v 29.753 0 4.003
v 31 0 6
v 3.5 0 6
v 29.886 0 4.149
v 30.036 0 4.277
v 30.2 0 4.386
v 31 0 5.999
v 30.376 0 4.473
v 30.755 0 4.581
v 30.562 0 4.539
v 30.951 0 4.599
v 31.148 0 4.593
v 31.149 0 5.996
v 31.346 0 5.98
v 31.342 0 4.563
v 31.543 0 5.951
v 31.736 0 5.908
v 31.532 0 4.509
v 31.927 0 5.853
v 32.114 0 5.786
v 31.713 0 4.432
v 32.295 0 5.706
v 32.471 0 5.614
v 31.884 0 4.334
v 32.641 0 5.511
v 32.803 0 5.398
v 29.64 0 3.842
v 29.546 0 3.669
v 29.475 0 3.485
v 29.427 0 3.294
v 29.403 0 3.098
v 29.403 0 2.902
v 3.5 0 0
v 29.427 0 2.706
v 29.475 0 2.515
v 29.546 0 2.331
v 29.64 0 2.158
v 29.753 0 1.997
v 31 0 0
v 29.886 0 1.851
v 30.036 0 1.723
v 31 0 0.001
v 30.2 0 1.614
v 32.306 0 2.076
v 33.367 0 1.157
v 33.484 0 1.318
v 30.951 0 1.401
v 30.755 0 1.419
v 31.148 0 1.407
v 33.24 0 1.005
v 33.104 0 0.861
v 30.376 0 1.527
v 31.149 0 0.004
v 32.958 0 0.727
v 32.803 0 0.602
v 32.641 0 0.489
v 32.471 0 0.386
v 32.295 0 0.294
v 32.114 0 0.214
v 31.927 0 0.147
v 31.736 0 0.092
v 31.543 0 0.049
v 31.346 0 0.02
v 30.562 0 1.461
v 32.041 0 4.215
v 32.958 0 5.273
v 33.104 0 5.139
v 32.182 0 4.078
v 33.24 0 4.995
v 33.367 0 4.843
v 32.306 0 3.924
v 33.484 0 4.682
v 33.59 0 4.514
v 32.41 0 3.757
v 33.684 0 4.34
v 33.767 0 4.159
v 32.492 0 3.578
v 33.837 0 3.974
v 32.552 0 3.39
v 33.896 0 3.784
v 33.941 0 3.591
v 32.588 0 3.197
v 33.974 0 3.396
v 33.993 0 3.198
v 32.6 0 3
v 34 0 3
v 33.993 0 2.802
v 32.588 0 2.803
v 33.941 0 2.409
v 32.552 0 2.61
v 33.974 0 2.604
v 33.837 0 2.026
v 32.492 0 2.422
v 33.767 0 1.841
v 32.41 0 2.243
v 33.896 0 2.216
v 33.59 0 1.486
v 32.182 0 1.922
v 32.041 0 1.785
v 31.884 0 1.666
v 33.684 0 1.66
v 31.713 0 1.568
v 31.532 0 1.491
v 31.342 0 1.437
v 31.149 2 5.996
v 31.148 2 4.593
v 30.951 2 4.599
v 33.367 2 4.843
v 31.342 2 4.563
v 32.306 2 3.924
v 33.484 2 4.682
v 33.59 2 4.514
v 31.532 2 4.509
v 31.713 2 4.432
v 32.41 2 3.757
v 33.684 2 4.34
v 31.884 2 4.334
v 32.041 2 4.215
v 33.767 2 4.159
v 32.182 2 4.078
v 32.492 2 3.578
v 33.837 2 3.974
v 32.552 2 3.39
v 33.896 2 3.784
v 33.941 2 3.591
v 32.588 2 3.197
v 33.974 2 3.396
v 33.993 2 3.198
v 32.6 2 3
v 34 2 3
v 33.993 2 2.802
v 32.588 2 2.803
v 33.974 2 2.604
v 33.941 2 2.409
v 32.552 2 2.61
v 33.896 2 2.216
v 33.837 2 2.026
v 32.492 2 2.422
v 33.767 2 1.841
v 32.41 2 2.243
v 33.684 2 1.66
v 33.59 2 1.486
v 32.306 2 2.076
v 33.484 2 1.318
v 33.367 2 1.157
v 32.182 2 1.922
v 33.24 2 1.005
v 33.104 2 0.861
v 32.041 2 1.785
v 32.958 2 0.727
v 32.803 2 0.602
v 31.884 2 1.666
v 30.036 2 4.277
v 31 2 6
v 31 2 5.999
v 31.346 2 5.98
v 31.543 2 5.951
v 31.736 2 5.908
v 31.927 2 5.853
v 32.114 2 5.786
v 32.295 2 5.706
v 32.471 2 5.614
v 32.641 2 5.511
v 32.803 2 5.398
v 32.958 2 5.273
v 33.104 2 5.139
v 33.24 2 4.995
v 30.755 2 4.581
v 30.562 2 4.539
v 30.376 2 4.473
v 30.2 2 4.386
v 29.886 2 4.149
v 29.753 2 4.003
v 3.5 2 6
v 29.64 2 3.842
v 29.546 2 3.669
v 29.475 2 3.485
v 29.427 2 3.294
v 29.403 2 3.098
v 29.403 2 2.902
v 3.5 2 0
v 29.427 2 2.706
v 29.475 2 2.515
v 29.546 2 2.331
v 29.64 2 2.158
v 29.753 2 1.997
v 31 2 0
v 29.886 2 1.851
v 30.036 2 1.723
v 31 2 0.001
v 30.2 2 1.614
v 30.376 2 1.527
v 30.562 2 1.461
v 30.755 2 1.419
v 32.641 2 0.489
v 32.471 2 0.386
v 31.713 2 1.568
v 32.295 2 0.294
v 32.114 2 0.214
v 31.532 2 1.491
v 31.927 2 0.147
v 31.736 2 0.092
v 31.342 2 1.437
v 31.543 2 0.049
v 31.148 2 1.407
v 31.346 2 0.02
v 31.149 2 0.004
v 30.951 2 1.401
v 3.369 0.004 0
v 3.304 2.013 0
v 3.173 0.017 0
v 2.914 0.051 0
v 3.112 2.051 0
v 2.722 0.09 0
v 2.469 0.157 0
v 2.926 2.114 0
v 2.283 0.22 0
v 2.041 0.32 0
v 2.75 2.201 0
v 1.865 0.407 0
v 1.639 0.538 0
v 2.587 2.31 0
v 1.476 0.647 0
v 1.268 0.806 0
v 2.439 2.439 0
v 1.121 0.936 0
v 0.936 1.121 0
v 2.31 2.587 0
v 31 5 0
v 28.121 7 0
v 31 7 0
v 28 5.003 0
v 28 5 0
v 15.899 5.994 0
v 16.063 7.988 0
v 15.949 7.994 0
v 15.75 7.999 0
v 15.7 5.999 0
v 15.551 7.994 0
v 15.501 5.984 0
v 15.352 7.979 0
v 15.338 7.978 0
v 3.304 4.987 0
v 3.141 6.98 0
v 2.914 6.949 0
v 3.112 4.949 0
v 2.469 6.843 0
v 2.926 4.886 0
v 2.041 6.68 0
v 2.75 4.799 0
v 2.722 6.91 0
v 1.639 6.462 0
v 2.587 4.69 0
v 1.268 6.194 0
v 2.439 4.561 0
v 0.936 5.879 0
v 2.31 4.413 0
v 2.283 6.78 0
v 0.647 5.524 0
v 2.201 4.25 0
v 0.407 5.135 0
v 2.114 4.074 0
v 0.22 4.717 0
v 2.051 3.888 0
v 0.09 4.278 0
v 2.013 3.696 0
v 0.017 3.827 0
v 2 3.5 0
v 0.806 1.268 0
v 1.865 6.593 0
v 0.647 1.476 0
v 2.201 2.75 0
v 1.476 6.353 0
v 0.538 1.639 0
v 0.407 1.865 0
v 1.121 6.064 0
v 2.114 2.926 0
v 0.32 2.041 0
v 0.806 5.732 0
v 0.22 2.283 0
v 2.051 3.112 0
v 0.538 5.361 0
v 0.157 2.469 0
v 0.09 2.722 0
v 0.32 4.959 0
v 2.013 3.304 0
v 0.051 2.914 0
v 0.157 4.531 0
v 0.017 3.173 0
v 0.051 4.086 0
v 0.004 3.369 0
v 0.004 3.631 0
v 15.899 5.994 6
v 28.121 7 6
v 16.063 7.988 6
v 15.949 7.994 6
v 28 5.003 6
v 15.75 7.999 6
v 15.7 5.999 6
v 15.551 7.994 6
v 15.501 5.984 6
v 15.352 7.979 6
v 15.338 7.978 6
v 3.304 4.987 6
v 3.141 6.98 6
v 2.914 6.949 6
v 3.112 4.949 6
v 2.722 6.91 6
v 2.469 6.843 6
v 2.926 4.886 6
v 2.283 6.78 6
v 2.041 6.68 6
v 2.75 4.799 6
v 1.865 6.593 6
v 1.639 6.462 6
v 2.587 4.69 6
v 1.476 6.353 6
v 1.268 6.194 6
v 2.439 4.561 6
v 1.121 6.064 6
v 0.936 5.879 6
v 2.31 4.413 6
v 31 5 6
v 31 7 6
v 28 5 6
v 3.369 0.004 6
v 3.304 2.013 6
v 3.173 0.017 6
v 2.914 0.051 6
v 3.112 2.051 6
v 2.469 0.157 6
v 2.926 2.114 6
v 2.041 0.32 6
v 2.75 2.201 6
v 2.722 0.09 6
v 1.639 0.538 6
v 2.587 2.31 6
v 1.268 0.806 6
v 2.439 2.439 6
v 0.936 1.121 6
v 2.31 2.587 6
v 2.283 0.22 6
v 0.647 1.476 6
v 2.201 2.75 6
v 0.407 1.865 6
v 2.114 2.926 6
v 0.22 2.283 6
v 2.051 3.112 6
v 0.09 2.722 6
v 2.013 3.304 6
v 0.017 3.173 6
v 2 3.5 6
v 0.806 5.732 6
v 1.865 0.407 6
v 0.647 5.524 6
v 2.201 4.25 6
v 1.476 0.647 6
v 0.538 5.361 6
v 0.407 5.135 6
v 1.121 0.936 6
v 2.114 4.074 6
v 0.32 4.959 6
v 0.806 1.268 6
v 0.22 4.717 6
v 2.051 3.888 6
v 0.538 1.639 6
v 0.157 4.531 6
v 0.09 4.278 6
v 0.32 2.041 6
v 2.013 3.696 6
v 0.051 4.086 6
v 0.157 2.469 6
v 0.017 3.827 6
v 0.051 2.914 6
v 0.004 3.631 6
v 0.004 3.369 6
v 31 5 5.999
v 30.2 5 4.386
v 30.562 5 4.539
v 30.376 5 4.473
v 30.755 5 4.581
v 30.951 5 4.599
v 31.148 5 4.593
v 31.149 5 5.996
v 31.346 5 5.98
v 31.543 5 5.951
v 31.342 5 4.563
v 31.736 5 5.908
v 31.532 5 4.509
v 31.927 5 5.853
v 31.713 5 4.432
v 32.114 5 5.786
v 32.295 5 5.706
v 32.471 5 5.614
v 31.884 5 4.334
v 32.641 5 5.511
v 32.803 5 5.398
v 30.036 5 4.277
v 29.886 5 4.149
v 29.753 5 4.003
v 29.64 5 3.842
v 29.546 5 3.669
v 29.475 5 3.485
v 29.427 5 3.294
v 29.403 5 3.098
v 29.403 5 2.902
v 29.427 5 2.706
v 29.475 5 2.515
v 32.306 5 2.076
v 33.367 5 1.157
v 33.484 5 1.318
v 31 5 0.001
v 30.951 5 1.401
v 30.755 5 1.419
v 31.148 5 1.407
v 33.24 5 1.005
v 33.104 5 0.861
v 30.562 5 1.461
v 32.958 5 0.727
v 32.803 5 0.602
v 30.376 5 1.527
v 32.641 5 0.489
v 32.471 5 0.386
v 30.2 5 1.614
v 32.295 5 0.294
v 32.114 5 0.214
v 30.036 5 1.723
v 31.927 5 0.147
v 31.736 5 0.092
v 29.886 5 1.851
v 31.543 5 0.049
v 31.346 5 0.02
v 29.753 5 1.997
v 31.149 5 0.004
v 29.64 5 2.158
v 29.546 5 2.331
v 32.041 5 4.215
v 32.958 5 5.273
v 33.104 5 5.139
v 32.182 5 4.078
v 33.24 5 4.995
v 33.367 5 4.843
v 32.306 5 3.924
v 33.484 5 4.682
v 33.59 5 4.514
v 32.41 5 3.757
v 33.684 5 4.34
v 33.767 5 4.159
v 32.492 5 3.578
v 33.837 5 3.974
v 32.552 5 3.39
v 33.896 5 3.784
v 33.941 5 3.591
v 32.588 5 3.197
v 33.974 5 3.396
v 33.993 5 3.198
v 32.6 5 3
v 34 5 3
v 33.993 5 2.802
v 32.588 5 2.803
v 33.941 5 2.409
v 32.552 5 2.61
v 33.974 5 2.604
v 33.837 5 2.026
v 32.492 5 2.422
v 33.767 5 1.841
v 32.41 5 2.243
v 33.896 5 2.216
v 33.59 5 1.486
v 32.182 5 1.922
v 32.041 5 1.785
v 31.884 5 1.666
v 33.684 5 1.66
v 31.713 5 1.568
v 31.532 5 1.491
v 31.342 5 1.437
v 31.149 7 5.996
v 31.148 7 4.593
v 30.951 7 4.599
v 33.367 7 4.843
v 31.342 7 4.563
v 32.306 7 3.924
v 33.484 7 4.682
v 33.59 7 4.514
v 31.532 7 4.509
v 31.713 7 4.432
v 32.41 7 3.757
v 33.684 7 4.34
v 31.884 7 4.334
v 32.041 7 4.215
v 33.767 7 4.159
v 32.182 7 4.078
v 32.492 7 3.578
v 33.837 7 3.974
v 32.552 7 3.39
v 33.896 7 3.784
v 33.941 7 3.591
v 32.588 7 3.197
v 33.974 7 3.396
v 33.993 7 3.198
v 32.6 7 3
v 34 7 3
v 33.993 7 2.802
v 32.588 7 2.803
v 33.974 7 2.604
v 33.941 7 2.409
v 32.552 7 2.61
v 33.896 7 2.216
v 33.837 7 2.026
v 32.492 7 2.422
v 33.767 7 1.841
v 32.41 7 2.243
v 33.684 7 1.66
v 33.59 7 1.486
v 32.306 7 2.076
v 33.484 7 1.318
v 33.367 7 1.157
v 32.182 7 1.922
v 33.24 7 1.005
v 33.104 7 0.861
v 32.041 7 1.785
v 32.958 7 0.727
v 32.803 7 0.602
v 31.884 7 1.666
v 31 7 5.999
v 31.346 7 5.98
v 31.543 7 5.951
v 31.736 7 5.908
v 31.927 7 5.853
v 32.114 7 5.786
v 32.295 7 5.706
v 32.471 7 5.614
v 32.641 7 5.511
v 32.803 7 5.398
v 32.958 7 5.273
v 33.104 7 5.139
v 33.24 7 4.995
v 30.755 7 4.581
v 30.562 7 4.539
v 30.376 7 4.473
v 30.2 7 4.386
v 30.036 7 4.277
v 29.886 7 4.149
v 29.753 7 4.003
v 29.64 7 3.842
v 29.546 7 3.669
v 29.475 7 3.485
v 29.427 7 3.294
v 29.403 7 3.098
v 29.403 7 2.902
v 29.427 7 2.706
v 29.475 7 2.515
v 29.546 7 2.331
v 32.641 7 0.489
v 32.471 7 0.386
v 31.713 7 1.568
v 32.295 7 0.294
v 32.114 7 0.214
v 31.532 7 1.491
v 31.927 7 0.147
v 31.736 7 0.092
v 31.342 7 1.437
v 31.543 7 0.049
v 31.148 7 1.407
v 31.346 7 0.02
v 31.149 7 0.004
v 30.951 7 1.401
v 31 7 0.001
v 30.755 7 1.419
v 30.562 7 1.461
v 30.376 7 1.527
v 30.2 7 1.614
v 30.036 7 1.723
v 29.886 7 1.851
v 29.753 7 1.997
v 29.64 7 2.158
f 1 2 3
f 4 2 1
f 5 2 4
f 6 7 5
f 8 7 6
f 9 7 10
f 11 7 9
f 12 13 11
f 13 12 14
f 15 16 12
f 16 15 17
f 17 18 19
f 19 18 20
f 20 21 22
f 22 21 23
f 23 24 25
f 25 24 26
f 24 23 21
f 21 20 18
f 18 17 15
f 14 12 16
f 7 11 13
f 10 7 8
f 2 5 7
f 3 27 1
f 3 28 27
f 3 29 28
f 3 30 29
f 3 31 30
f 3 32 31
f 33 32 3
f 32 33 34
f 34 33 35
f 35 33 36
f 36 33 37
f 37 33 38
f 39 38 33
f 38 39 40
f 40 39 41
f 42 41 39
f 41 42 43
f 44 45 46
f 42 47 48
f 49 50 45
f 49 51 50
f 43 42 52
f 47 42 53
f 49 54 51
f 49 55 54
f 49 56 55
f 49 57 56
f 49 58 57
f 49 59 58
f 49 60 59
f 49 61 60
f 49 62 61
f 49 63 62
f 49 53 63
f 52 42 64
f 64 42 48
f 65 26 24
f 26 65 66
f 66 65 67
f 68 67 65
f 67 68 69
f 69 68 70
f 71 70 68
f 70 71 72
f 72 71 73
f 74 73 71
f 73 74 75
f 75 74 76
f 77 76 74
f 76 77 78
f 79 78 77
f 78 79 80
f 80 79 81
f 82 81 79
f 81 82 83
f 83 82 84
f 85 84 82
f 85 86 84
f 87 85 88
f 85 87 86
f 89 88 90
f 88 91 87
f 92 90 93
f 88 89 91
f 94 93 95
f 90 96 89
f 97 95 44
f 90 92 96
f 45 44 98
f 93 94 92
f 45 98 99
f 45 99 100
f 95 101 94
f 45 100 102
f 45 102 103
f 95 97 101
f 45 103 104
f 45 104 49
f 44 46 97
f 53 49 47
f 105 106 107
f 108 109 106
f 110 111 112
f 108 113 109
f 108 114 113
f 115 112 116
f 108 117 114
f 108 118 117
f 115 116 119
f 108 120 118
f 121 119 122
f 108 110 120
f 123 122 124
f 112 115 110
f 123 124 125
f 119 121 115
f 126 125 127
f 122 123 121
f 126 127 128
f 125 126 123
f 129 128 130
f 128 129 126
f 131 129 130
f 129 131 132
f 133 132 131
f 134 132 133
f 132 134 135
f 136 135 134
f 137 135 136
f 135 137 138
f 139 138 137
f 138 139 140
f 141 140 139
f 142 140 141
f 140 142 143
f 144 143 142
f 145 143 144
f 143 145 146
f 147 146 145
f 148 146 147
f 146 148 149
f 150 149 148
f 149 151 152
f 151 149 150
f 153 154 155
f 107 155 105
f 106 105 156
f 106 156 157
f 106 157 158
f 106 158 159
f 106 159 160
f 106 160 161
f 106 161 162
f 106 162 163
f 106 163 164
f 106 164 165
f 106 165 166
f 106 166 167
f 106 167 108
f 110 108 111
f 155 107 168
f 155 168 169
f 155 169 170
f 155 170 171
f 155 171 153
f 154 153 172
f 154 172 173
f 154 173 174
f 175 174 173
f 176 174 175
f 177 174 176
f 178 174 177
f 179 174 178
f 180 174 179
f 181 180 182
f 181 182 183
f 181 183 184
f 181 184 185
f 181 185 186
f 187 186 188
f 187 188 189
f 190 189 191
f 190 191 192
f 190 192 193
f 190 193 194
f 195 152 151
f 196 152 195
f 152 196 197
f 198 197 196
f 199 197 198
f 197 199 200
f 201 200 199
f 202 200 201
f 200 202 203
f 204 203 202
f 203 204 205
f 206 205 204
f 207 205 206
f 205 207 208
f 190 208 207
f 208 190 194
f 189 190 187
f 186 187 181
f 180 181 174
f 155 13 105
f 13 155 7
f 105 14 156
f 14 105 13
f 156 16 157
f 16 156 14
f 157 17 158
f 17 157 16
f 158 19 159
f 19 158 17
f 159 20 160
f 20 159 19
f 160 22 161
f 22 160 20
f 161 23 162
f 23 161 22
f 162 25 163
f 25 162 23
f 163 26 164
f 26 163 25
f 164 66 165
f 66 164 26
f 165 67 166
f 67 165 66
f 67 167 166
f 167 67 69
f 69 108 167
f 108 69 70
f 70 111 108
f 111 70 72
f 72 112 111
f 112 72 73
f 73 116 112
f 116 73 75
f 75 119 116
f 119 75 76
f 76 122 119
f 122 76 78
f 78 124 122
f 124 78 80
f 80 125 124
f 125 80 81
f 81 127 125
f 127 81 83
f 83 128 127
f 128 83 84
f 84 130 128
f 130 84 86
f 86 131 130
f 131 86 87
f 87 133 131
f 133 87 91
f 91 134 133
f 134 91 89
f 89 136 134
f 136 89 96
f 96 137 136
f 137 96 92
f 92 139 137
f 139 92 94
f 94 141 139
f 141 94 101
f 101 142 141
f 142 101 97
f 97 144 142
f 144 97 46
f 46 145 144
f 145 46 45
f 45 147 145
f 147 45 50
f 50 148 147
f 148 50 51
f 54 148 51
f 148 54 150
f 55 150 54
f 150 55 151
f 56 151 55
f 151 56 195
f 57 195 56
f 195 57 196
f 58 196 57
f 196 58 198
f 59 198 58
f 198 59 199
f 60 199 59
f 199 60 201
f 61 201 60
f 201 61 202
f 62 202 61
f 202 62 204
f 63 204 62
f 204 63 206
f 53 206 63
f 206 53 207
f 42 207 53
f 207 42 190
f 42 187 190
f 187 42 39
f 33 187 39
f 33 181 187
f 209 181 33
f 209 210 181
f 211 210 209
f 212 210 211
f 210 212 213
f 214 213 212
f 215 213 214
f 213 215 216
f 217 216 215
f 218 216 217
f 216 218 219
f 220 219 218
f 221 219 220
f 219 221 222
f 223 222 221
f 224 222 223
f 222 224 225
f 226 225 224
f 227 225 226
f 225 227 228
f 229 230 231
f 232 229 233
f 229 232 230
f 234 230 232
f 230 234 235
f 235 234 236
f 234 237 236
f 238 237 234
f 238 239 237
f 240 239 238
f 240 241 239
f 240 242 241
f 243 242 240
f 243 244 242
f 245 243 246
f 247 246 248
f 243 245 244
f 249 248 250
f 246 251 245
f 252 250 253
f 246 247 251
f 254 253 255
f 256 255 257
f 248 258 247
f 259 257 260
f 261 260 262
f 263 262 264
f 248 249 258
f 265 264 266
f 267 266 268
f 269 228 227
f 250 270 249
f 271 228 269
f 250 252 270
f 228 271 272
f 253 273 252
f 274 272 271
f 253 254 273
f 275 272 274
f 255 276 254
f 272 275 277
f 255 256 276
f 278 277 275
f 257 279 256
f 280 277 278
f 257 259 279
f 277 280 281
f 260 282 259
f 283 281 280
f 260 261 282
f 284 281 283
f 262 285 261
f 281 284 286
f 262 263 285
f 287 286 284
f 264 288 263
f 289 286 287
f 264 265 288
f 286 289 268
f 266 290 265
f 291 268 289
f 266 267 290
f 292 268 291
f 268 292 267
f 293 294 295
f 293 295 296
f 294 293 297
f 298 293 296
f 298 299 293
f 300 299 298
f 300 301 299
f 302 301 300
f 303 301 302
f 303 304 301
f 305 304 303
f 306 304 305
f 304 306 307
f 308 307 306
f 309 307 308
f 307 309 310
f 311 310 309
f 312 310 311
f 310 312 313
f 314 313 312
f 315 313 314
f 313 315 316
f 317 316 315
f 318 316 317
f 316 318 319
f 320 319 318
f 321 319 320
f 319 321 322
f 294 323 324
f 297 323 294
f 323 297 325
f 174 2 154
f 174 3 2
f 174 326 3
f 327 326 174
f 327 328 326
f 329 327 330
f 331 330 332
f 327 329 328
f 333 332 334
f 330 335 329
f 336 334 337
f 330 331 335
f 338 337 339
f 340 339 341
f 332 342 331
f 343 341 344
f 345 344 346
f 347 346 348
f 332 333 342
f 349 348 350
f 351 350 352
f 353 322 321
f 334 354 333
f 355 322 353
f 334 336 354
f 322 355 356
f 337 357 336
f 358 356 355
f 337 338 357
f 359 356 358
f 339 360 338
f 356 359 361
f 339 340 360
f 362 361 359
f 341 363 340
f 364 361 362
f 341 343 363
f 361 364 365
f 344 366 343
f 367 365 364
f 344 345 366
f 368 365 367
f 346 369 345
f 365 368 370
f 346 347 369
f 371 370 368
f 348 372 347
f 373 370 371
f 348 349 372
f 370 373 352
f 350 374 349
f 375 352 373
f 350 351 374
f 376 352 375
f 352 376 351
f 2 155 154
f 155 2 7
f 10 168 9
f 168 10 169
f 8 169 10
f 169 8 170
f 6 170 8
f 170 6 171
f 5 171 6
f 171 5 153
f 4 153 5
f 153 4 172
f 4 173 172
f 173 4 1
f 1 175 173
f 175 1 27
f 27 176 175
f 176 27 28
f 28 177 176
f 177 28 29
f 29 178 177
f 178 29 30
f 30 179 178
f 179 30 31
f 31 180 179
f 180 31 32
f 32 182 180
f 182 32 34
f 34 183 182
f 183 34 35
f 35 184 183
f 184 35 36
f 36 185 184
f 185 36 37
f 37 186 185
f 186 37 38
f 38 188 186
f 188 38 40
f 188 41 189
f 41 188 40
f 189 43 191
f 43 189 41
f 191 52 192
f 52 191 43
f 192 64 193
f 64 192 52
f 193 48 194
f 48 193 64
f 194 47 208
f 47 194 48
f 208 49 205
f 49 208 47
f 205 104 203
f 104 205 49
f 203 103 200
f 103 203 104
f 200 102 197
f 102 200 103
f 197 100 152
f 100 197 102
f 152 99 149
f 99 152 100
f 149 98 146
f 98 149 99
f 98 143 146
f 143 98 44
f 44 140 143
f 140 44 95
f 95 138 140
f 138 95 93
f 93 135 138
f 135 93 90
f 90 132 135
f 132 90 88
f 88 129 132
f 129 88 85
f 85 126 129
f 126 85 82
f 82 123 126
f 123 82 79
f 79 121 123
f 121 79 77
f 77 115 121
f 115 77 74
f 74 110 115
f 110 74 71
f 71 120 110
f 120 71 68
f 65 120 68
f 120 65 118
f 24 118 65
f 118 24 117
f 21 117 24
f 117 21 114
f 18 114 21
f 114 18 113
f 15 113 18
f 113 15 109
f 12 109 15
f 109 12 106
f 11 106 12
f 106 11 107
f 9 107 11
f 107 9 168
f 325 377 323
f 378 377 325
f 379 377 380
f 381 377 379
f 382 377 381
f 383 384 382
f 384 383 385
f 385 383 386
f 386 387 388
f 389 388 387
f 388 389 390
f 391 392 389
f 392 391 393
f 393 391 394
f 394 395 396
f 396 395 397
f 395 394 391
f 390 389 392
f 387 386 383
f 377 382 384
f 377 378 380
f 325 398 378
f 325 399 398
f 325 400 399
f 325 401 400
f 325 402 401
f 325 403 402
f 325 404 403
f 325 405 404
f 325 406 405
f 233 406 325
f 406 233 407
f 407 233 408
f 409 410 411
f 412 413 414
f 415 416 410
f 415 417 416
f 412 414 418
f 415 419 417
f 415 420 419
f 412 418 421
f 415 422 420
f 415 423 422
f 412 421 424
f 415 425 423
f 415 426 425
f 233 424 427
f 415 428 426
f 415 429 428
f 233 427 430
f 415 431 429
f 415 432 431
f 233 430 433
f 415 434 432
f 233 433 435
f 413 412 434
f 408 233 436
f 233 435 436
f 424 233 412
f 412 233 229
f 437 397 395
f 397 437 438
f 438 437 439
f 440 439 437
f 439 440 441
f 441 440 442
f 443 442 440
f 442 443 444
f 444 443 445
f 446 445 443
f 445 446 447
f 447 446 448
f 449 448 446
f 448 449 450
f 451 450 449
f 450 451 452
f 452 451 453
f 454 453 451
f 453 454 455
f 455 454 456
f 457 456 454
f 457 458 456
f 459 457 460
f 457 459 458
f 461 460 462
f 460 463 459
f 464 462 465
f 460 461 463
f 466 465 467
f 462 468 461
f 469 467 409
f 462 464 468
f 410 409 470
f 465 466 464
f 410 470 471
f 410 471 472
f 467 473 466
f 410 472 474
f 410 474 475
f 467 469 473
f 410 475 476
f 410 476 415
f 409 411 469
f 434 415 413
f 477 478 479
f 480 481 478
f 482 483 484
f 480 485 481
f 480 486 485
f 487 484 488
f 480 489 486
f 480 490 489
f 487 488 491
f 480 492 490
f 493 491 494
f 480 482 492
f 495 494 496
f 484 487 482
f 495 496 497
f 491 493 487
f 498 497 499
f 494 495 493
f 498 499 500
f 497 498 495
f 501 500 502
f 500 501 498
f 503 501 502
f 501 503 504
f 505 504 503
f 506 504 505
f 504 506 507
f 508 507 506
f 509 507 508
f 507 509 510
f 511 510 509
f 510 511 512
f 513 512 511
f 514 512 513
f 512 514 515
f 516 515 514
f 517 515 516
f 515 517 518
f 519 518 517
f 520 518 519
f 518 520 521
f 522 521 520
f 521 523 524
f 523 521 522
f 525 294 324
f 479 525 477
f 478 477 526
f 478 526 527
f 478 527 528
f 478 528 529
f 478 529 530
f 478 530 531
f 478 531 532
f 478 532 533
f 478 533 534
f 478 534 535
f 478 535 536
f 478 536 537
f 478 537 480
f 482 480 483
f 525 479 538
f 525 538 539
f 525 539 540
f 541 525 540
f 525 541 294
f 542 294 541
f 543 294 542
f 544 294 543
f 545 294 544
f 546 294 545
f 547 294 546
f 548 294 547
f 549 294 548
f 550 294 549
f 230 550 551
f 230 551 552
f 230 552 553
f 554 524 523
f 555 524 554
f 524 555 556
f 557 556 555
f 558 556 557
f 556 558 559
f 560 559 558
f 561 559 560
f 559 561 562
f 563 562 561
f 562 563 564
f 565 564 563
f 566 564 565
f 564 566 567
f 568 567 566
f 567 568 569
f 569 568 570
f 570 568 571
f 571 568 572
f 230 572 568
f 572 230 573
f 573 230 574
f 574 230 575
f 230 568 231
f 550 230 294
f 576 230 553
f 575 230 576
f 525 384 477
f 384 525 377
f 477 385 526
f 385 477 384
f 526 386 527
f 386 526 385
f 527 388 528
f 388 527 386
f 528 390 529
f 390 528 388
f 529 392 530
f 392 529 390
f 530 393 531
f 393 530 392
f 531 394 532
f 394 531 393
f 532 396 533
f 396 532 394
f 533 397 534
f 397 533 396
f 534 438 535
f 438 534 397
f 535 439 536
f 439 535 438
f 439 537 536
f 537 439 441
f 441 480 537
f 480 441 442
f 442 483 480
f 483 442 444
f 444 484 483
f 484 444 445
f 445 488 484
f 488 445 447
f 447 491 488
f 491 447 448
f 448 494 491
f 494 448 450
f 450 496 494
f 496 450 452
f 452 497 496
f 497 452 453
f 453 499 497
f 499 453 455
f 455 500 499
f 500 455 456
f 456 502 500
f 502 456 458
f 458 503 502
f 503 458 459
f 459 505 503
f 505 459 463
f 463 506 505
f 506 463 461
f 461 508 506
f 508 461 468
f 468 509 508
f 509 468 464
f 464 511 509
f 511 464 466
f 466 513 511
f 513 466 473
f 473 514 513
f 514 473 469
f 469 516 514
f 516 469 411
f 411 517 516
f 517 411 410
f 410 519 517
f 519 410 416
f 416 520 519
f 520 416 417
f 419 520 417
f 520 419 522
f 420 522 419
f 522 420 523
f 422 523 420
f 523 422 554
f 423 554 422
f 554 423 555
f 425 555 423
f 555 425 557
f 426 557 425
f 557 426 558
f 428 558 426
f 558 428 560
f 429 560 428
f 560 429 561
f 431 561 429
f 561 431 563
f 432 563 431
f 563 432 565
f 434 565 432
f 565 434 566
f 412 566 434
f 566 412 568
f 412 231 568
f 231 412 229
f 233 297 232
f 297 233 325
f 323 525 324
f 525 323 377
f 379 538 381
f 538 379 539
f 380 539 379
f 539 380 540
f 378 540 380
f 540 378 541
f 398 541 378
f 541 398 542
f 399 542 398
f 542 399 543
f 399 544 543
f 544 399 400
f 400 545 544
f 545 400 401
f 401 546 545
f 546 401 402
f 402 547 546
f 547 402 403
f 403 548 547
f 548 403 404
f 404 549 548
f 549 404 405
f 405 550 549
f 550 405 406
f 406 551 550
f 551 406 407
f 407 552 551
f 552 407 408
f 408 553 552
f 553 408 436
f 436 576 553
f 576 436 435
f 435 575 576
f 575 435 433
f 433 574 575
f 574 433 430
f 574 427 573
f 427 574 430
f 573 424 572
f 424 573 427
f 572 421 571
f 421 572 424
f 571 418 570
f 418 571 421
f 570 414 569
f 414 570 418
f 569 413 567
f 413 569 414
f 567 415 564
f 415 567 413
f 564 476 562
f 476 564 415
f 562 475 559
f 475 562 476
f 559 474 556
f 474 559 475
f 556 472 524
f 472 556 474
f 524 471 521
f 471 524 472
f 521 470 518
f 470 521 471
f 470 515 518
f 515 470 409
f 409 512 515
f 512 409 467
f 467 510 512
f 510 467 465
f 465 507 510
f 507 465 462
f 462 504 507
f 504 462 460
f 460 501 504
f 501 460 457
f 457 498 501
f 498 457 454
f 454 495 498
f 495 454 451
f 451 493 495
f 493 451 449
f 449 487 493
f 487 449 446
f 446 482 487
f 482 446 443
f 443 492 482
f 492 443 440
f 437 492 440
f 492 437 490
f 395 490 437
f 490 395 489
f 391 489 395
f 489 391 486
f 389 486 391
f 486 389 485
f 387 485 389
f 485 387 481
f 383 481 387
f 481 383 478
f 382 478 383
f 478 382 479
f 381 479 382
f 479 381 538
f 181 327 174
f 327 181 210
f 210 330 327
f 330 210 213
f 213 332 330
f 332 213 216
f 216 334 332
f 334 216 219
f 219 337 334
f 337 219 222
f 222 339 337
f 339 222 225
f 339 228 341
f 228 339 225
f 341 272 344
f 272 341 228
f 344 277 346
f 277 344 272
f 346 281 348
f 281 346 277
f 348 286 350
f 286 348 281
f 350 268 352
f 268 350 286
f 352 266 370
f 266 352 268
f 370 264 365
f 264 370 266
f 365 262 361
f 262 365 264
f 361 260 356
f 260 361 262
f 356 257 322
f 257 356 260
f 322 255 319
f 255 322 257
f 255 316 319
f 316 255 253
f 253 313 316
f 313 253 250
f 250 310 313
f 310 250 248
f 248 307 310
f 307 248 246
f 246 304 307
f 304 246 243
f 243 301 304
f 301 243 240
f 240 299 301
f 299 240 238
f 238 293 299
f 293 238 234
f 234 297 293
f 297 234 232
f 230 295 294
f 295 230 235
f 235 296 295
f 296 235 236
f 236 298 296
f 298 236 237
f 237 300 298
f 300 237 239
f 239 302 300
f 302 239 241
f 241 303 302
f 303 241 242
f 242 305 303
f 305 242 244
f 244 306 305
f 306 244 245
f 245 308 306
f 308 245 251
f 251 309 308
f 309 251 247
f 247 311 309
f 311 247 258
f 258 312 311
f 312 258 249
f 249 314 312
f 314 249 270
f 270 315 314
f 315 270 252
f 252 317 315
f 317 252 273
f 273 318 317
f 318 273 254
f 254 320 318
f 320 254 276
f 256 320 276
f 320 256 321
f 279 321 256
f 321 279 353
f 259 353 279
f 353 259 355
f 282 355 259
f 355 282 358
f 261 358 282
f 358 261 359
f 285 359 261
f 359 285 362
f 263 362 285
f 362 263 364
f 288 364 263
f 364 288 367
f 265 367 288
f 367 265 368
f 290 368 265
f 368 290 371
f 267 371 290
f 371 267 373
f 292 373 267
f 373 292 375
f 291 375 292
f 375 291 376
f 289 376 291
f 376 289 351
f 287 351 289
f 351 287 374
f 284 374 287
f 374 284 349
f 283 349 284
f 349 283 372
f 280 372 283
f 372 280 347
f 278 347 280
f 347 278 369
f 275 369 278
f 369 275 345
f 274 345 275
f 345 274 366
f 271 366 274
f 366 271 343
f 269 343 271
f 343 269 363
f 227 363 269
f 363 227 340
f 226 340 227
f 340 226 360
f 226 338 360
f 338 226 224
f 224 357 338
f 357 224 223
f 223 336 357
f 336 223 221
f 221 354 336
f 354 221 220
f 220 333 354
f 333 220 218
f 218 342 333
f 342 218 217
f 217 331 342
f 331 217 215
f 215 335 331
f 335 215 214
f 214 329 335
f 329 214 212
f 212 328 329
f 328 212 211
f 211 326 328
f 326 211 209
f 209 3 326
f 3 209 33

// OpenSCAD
l = 26;
d1 = 3;
d2 = 4;
h = 6;
w = 2;

$fa=0.2;
$fs=0.2;

module base_shape() {
    hull() {
        circle(d = d1);
        translate([(l-d1/2)/2,(d2-d1)/2])
        circle(d = d2);
        translate([l-d1/2,0])
        circle(d = d1);    
    }
}


module base() {
    linear_extrude(h)
    difference() {
        translate([d1/2+w,d1/2+w])
        difference() {
            offset(w)
            base_shape();
            base_shape();
        }

        translate([l+w,0])
        square([d1+w,d1+w*2]);
    }
}

module ear() {
    //translate([h/2,h/2])
    linear_extrude(w)
    difference() {
        union() {
            circle(d = h);
            translate([-h/2,-h/2])
            square([h/2,h]);
        }
        circle(d = 3.2);
    }    
}

module ears() { 

    translate([h/2+l+w,0,h/2])
    rotate([-90,0,0])
    union() {
        ear();
        
        translate([0,0,w+d1])
        ear();
    }

}

module wire_lock() {
    base();
    ears();
}

wire_lock();
